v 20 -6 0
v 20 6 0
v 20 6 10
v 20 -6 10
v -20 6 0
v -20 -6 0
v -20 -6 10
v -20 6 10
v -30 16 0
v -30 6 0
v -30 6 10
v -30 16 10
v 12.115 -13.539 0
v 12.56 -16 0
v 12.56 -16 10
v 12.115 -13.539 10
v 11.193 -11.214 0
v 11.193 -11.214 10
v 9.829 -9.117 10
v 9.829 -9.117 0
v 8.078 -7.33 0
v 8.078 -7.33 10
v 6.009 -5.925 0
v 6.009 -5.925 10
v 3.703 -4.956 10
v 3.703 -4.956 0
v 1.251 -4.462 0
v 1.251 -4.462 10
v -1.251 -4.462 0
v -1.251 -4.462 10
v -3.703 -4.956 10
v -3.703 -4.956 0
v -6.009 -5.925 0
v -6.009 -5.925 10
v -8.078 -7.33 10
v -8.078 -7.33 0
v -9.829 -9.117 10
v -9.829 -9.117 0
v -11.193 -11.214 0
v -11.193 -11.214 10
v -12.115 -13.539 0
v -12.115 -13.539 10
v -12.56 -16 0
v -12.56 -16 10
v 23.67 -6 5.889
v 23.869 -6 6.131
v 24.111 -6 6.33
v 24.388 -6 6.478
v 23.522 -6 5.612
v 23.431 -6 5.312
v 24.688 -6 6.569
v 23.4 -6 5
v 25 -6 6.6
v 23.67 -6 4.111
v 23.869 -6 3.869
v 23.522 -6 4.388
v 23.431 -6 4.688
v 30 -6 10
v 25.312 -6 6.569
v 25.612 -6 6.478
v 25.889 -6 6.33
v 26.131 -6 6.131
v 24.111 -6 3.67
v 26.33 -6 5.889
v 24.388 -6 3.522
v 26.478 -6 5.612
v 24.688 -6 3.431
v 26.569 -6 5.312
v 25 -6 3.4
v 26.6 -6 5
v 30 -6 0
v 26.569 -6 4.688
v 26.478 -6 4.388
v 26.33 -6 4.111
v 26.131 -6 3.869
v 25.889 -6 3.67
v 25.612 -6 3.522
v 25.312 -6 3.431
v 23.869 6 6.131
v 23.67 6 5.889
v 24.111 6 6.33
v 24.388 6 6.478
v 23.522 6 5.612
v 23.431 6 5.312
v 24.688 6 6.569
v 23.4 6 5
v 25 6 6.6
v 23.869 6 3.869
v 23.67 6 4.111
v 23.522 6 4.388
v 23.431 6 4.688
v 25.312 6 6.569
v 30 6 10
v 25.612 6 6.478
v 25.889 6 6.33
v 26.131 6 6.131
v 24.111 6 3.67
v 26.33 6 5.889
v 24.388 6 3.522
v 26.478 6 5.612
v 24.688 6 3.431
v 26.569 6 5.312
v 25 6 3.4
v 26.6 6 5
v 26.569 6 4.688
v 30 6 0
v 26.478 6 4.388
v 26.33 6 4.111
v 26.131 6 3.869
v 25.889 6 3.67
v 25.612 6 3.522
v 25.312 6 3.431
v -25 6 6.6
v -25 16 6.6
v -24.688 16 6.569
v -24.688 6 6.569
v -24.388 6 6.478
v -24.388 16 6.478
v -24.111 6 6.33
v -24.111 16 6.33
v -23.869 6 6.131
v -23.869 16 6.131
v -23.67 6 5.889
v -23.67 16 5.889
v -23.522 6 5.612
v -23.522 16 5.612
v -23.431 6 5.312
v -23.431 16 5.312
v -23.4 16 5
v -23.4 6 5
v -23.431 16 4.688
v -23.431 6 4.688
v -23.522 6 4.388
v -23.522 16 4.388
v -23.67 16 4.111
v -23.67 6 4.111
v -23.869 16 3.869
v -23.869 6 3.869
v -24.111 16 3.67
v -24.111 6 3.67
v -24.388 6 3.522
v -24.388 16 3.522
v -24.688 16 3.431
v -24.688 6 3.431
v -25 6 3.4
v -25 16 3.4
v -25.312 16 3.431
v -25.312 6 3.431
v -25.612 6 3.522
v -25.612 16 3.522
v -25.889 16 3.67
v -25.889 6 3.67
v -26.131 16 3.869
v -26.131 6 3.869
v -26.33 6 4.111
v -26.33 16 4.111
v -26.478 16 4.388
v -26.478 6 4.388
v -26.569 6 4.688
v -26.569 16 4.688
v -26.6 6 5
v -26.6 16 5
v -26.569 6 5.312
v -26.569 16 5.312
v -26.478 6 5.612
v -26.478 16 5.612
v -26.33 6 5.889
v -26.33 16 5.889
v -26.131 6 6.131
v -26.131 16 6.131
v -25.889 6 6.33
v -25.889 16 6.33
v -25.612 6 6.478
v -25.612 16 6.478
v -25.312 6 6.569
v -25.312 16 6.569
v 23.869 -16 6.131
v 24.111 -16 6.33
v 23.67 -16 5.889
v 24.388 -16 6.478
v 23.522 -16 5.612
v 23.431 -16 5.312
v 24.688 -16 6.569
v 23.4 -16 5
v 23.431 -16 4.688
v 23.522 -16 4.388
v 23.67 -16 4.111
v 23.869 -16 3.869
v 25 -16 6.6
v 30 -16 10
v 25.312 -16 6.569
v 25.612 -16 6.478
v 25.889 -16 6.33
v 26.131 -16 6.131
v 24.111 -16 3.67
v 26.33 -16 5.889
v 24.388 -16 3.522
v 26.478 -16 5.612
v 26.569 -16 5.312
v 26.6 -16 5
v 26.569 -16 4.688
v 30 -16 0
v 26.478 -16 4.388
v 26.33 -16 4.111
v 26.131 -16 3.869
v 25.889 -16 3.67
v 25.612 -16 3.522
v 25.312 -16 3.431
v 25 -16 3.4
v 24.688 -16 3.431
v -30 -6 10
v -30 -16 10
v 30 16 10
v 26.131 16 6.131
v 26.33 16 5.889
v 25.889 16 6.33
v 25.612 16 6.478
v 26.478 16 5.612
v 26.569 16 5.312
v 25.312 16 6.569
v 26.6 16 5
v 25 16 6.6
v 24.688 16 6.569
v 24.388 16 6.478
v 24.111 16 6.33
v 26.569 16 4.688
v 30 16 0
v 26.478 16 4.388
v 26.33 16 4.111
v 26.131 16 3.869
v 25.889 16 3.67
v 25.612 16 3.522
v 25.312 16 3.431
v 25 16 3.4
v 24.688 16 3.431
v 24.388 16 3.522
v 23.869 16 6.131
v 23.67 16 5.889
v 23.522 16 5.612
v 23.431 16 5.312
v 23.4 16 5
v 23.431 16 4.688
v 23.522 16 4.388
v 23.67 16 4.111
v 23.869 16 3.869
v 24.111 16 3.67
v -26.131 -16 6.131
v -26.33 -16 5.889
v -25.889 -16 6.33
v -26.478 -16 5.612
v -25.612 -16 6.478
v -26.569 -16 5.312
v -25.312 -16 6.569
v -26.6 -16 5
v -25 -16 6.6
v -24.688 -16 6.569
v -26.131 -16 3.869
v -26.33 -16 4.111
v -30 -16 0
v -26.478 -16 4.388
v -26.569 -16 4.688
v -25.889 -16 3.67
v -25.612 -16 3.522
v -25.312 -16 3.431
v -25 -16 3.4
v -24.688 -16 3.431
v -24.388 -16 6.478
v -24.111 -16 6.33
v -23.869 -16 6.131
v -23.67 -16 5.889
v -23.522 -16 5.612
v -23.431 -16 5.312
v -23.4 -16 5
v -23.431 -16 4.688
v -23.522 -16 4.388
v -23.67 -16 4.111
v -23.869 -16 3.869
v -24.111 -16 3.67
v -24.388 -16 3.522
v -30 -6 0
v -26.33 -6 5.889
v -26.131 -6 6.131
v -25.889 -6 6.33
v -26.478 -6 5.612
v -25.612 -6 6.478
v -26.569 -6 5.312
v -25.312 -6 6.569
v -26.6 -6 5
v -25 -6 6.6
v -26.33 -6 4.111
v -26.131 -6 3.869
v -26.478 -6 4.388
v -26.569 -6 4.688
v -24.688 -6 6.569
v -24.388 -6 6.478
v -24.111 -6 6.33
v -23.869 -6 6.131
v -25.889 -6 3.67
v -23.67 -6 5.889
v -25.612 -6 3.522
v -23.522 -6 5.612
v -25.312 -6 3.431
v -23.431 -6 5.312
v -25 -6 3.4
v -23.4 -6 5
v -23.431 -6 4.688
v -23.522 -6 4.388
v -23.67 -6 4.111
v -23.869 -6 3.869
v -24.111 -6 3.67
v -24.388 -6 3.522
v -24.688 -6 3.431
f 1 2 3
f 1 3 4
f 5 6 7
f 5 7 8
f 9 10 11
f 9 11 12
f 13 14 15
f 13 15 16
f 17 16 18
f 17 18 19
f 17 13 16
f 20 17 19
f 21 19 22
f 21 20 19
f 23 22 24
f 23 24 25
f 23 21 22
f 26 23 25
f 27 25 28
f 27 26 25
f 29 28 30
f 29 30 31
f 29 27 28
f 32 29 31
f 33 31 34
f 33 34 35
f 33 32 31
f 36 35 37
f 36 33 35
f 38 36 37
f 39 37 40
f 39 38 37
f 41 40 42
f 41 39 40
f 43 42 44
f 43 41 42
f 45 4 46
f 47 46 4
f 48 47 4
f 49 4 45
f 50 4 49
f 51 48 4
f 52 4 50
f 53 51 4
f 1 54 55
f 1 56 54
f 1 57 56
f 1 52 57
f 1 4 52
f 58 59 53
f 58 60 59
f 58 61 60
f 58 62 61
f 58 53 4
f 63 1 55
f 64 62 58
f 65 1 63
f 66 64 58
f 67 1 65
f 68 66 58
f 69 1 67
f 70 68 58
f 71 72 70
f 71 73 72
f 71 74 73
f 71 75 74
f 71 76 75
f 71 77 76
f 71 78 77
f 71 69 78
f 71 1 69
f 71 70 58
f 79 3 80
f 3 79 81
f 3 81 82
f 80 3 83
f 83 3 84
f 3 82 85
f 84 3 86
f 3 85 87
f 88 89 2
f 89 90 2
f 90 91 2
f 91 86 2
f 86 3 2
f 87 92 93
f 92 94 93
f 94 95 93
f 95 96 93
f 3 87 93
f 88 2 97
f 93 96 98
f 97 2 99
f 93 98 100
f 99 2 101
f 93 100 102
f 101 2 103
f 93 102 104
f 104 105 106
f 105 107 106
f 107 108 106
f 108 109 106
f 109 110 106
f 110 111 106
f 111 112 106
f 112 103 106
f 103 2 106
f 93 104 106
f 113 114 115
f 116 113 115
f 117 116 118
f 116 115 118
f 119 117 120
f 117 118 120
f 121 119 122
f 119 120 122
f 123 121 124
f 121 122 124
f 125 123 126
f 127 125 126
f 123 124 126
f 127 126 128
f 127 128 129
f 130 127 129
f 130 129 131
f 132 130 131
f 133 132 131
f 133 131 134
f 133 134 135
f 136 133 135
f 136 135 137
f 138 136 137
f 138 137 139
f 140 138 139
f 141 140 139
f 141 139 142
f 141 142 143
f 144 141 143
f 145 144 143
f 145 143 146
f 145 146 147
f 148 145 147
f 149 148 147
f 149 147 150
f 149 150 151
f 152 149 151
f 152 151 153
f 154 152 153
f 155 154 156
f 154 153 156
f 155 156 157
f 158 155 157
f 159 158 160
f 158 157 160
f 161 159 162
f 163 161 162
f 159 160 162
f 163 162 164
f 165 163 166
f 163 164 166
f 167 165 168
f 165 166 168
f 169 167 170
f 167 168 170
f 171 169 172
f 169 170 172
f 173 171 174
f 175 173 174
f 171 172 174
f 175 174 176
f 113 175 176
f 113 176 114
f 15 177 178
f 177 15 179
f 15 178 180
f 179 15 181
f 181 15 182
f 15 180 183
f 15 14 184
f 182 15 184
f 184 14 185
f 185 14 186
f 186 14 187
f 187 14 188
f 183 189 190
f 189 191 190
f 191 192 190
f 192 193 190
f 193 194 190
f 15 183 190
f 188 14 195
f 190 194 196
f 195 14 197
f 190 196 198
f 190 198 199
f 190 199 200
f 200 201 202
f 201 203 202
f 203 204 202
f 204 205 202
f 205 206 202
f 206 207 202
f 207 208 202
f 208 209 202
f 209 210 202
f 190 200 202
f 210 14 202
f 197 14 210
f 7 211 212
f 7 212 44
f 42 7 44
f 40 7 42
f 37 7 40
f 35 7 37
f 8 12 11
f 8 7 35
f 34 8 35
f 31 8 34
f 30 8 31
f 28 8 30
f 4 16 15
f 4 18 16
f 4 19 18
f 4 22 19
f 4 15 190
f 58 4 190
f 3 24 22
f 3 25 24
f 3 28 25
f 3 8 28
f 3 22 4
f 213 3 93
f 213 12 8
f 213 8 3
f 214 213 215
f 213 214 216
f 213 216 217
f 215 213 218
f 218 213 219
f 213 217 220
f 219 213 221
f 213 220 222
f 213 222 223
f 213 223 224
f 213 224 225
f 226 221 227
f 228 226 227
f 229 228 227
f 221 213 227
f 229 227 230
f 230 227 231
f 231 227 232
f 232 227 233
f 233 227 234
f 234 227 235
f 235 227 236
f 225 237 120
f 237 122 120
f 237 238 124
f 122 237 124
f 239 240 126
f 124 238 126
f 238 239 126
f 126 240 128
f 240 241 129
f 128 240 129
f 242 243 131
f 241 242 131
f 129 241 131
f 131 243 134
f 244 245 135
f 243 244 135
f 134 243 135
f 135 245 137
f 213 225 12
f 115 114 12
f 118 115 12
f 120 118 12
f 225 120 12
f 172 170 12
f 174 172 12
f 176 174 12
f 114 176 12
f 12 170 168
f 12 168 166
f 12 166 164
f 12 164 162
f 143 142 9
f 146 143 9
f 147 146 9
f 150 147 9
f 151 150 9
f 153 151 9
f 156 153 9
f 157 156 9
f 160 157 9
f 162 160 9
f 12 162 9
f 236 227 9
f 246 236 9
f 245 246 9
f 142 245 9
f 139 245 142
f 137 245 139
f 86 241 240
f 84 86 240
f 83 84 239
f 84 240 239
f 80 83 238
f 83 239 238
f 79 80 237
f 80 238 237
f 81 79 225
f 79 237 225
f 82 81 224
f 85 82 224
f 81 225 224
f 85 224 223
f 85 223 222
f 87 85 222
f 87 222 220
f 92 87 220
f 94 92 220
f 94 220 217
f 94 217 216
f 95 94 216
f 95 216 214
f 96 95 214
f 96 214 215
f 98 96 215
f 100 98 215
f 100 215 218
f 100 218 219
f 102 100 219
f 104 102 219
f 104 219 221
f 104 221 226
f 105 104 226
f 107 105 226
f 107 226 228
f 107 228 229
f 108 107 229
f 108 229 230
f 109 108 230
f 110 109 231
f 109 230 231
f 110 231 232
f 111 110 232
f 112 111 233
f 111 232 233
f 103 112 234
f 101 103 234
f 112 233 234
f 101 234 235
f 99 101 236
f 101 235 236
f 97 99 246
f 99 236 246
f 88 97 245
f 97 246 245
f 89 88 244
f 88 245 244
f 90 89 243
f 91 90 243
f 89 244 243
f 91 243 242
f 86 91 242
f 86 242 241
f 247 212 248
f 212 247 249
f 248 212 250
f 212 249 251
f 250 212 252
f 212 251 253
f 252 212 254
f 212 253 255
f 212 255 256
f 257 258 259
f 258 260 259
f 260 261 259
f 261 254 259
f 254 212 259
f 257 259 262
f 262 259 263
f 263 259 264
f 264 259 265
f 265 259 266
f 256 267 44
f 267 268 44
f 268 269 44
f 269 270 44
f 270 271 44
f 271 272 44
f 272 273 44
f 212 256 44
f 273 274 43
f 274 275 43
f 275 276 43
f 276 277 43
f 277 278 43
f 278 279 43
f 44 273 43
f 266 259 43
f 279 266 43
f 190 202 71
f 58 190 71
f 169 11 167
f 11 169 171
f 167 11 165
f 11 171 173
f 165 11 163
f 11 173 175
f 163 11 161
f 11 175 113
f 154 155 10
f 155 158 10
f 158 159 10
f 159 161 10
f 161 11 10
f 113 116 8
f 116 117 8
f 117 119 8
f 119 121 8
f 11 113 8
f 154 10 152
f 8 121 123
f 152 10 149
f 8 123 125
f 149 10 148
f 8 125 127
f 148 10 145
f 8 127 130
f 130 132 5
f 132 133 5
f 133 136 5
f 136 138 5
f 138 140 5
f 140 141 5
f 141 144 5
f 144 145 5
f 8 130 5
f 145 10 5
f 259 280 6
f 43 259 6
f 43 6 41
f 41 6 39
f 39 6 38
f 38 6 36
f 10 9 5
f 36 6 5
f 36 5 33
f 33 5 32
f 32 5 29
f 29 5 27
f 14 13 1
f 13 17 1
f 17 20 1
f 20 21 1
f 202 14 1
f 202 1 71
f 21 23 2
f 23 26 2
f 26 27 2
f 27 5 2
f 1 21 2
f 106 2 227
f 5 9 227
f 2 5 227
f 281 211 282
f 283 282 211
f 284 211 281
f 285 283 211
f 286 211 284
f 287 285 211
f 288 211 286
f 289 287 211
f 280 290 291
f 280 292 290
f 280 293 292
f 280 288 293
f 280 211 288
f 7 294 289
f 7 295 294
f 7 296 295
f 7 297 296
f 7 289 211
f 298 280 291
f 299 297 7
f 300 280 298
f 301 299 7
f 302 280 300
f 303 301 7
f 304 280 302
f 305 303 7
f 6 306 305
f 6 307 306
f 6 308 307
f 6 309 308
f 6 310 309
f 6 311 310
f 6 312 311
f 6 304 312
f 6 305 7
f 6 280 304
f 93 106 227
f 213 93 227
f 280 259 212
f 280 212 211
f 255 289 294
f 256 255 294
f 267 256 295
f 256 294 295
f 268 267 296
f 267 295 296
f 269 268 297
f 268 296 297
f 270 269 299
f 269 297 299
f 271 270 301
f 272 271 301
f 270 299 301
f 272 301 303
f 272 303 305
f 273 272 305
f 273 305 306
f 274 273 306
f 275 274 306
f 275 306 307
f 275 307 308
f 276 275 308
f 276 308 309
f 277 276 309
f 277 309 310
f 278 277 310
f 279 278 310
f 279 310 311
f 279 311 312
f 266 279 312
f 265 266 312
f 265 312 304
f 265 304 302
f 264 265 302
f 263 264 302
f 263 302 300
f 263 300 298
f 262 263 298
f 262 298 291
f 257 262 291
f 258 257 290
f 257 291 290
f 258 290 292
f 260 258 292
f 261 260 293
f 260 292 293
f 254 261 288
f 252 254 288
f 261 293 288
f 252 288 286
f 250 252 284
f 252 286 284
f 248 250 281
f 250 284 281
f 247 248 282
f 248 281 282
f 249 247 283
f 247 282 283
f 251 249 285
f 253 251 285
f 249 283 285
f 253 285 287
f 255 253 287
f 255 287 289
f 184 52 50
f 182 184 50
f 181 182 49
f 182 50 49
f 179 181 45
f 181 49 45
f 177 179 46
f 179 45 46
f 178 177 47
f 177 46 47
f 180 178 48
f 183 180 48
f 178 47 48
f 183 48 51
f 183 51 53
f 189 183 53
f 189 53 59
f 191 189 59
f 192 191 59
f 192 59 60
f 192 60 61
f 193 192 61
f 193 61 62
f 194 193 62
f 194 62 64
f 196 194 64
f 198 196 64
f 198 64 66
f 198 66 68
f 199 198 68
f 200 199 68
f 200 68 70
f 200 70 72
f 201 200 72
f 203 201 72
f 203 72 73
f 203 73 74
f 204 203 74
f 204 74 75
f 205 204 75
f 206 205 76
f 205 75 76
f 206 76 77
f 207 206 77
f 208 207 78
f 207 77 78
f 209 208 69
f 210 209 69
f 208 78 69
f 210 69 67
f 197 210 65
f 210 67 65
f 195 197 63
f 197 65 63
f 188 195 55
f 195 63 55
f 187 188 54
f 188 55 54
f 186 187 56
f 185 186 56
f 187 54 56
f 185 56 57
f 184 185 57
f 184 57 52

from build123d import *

# Parameters (mm, degrees)
SKETCH_1_W          = 10
SKETCH_1_H          = 10
EXTRUDE_1_DEPTH     = 10
SKETCH_3_R          = 1.6
CUT_EXTRUDE_1_DEPTH = 32


with BuildPart() as part:
    # Эскиз1 → Бобышка-Вытянуть1 (new body)
    with BuildSketch(Plane.XY):
        with Locations((-25, 11)):
            Rectangle(SKETCH_1_W, SKETCH_1_H)
        with BuildLine():
            ThreePointArc((12.560254774, -16), (0, -4.4), (-12.560254774, -16))
            Line((-12.560254774, -16), (-20, -16))
            Line((-20, -16), (-20, 16))
            Line((-20, 16), (20, 16))
            Line((20, 16), (20, -16))
            Line((20, -16), (12.560254774, -16))
        make_face()
        with Locations((-25, -11)):
            Rectangle(SKETCH_1_W, SKETCH_1_H)
        with Locations((25, 11)):
            Rectangle(SKETCH_1_W, SKETCH_1_H)
        with Locations((25, -11)):
            Rectangle(SKETCH_1_W, SKETCH_1_H)
    extrude(amount=EXTRUDE_1_DEPTH)

    # Эскиз3 → Вырез-Вытянуть1 (cut)
    with BuildSketch(Plane(origin=(0, 16, 0), x_dir=(1, 0, 0), z_dir=(0, 1, 0))):
        with Locations(Location((-25, -5, 0), (0, 0, 270))):
            Circle(SKETCH_3_R)
        with Locations(Location((25, -5, 0), (0, 0, 180))):
            Circle(SKETCH_3_R)
    extrude(amount=-CUT_EXTRUDE_1_DEPTH, mode=Mode.SUBTRACT)


solid = part.part
